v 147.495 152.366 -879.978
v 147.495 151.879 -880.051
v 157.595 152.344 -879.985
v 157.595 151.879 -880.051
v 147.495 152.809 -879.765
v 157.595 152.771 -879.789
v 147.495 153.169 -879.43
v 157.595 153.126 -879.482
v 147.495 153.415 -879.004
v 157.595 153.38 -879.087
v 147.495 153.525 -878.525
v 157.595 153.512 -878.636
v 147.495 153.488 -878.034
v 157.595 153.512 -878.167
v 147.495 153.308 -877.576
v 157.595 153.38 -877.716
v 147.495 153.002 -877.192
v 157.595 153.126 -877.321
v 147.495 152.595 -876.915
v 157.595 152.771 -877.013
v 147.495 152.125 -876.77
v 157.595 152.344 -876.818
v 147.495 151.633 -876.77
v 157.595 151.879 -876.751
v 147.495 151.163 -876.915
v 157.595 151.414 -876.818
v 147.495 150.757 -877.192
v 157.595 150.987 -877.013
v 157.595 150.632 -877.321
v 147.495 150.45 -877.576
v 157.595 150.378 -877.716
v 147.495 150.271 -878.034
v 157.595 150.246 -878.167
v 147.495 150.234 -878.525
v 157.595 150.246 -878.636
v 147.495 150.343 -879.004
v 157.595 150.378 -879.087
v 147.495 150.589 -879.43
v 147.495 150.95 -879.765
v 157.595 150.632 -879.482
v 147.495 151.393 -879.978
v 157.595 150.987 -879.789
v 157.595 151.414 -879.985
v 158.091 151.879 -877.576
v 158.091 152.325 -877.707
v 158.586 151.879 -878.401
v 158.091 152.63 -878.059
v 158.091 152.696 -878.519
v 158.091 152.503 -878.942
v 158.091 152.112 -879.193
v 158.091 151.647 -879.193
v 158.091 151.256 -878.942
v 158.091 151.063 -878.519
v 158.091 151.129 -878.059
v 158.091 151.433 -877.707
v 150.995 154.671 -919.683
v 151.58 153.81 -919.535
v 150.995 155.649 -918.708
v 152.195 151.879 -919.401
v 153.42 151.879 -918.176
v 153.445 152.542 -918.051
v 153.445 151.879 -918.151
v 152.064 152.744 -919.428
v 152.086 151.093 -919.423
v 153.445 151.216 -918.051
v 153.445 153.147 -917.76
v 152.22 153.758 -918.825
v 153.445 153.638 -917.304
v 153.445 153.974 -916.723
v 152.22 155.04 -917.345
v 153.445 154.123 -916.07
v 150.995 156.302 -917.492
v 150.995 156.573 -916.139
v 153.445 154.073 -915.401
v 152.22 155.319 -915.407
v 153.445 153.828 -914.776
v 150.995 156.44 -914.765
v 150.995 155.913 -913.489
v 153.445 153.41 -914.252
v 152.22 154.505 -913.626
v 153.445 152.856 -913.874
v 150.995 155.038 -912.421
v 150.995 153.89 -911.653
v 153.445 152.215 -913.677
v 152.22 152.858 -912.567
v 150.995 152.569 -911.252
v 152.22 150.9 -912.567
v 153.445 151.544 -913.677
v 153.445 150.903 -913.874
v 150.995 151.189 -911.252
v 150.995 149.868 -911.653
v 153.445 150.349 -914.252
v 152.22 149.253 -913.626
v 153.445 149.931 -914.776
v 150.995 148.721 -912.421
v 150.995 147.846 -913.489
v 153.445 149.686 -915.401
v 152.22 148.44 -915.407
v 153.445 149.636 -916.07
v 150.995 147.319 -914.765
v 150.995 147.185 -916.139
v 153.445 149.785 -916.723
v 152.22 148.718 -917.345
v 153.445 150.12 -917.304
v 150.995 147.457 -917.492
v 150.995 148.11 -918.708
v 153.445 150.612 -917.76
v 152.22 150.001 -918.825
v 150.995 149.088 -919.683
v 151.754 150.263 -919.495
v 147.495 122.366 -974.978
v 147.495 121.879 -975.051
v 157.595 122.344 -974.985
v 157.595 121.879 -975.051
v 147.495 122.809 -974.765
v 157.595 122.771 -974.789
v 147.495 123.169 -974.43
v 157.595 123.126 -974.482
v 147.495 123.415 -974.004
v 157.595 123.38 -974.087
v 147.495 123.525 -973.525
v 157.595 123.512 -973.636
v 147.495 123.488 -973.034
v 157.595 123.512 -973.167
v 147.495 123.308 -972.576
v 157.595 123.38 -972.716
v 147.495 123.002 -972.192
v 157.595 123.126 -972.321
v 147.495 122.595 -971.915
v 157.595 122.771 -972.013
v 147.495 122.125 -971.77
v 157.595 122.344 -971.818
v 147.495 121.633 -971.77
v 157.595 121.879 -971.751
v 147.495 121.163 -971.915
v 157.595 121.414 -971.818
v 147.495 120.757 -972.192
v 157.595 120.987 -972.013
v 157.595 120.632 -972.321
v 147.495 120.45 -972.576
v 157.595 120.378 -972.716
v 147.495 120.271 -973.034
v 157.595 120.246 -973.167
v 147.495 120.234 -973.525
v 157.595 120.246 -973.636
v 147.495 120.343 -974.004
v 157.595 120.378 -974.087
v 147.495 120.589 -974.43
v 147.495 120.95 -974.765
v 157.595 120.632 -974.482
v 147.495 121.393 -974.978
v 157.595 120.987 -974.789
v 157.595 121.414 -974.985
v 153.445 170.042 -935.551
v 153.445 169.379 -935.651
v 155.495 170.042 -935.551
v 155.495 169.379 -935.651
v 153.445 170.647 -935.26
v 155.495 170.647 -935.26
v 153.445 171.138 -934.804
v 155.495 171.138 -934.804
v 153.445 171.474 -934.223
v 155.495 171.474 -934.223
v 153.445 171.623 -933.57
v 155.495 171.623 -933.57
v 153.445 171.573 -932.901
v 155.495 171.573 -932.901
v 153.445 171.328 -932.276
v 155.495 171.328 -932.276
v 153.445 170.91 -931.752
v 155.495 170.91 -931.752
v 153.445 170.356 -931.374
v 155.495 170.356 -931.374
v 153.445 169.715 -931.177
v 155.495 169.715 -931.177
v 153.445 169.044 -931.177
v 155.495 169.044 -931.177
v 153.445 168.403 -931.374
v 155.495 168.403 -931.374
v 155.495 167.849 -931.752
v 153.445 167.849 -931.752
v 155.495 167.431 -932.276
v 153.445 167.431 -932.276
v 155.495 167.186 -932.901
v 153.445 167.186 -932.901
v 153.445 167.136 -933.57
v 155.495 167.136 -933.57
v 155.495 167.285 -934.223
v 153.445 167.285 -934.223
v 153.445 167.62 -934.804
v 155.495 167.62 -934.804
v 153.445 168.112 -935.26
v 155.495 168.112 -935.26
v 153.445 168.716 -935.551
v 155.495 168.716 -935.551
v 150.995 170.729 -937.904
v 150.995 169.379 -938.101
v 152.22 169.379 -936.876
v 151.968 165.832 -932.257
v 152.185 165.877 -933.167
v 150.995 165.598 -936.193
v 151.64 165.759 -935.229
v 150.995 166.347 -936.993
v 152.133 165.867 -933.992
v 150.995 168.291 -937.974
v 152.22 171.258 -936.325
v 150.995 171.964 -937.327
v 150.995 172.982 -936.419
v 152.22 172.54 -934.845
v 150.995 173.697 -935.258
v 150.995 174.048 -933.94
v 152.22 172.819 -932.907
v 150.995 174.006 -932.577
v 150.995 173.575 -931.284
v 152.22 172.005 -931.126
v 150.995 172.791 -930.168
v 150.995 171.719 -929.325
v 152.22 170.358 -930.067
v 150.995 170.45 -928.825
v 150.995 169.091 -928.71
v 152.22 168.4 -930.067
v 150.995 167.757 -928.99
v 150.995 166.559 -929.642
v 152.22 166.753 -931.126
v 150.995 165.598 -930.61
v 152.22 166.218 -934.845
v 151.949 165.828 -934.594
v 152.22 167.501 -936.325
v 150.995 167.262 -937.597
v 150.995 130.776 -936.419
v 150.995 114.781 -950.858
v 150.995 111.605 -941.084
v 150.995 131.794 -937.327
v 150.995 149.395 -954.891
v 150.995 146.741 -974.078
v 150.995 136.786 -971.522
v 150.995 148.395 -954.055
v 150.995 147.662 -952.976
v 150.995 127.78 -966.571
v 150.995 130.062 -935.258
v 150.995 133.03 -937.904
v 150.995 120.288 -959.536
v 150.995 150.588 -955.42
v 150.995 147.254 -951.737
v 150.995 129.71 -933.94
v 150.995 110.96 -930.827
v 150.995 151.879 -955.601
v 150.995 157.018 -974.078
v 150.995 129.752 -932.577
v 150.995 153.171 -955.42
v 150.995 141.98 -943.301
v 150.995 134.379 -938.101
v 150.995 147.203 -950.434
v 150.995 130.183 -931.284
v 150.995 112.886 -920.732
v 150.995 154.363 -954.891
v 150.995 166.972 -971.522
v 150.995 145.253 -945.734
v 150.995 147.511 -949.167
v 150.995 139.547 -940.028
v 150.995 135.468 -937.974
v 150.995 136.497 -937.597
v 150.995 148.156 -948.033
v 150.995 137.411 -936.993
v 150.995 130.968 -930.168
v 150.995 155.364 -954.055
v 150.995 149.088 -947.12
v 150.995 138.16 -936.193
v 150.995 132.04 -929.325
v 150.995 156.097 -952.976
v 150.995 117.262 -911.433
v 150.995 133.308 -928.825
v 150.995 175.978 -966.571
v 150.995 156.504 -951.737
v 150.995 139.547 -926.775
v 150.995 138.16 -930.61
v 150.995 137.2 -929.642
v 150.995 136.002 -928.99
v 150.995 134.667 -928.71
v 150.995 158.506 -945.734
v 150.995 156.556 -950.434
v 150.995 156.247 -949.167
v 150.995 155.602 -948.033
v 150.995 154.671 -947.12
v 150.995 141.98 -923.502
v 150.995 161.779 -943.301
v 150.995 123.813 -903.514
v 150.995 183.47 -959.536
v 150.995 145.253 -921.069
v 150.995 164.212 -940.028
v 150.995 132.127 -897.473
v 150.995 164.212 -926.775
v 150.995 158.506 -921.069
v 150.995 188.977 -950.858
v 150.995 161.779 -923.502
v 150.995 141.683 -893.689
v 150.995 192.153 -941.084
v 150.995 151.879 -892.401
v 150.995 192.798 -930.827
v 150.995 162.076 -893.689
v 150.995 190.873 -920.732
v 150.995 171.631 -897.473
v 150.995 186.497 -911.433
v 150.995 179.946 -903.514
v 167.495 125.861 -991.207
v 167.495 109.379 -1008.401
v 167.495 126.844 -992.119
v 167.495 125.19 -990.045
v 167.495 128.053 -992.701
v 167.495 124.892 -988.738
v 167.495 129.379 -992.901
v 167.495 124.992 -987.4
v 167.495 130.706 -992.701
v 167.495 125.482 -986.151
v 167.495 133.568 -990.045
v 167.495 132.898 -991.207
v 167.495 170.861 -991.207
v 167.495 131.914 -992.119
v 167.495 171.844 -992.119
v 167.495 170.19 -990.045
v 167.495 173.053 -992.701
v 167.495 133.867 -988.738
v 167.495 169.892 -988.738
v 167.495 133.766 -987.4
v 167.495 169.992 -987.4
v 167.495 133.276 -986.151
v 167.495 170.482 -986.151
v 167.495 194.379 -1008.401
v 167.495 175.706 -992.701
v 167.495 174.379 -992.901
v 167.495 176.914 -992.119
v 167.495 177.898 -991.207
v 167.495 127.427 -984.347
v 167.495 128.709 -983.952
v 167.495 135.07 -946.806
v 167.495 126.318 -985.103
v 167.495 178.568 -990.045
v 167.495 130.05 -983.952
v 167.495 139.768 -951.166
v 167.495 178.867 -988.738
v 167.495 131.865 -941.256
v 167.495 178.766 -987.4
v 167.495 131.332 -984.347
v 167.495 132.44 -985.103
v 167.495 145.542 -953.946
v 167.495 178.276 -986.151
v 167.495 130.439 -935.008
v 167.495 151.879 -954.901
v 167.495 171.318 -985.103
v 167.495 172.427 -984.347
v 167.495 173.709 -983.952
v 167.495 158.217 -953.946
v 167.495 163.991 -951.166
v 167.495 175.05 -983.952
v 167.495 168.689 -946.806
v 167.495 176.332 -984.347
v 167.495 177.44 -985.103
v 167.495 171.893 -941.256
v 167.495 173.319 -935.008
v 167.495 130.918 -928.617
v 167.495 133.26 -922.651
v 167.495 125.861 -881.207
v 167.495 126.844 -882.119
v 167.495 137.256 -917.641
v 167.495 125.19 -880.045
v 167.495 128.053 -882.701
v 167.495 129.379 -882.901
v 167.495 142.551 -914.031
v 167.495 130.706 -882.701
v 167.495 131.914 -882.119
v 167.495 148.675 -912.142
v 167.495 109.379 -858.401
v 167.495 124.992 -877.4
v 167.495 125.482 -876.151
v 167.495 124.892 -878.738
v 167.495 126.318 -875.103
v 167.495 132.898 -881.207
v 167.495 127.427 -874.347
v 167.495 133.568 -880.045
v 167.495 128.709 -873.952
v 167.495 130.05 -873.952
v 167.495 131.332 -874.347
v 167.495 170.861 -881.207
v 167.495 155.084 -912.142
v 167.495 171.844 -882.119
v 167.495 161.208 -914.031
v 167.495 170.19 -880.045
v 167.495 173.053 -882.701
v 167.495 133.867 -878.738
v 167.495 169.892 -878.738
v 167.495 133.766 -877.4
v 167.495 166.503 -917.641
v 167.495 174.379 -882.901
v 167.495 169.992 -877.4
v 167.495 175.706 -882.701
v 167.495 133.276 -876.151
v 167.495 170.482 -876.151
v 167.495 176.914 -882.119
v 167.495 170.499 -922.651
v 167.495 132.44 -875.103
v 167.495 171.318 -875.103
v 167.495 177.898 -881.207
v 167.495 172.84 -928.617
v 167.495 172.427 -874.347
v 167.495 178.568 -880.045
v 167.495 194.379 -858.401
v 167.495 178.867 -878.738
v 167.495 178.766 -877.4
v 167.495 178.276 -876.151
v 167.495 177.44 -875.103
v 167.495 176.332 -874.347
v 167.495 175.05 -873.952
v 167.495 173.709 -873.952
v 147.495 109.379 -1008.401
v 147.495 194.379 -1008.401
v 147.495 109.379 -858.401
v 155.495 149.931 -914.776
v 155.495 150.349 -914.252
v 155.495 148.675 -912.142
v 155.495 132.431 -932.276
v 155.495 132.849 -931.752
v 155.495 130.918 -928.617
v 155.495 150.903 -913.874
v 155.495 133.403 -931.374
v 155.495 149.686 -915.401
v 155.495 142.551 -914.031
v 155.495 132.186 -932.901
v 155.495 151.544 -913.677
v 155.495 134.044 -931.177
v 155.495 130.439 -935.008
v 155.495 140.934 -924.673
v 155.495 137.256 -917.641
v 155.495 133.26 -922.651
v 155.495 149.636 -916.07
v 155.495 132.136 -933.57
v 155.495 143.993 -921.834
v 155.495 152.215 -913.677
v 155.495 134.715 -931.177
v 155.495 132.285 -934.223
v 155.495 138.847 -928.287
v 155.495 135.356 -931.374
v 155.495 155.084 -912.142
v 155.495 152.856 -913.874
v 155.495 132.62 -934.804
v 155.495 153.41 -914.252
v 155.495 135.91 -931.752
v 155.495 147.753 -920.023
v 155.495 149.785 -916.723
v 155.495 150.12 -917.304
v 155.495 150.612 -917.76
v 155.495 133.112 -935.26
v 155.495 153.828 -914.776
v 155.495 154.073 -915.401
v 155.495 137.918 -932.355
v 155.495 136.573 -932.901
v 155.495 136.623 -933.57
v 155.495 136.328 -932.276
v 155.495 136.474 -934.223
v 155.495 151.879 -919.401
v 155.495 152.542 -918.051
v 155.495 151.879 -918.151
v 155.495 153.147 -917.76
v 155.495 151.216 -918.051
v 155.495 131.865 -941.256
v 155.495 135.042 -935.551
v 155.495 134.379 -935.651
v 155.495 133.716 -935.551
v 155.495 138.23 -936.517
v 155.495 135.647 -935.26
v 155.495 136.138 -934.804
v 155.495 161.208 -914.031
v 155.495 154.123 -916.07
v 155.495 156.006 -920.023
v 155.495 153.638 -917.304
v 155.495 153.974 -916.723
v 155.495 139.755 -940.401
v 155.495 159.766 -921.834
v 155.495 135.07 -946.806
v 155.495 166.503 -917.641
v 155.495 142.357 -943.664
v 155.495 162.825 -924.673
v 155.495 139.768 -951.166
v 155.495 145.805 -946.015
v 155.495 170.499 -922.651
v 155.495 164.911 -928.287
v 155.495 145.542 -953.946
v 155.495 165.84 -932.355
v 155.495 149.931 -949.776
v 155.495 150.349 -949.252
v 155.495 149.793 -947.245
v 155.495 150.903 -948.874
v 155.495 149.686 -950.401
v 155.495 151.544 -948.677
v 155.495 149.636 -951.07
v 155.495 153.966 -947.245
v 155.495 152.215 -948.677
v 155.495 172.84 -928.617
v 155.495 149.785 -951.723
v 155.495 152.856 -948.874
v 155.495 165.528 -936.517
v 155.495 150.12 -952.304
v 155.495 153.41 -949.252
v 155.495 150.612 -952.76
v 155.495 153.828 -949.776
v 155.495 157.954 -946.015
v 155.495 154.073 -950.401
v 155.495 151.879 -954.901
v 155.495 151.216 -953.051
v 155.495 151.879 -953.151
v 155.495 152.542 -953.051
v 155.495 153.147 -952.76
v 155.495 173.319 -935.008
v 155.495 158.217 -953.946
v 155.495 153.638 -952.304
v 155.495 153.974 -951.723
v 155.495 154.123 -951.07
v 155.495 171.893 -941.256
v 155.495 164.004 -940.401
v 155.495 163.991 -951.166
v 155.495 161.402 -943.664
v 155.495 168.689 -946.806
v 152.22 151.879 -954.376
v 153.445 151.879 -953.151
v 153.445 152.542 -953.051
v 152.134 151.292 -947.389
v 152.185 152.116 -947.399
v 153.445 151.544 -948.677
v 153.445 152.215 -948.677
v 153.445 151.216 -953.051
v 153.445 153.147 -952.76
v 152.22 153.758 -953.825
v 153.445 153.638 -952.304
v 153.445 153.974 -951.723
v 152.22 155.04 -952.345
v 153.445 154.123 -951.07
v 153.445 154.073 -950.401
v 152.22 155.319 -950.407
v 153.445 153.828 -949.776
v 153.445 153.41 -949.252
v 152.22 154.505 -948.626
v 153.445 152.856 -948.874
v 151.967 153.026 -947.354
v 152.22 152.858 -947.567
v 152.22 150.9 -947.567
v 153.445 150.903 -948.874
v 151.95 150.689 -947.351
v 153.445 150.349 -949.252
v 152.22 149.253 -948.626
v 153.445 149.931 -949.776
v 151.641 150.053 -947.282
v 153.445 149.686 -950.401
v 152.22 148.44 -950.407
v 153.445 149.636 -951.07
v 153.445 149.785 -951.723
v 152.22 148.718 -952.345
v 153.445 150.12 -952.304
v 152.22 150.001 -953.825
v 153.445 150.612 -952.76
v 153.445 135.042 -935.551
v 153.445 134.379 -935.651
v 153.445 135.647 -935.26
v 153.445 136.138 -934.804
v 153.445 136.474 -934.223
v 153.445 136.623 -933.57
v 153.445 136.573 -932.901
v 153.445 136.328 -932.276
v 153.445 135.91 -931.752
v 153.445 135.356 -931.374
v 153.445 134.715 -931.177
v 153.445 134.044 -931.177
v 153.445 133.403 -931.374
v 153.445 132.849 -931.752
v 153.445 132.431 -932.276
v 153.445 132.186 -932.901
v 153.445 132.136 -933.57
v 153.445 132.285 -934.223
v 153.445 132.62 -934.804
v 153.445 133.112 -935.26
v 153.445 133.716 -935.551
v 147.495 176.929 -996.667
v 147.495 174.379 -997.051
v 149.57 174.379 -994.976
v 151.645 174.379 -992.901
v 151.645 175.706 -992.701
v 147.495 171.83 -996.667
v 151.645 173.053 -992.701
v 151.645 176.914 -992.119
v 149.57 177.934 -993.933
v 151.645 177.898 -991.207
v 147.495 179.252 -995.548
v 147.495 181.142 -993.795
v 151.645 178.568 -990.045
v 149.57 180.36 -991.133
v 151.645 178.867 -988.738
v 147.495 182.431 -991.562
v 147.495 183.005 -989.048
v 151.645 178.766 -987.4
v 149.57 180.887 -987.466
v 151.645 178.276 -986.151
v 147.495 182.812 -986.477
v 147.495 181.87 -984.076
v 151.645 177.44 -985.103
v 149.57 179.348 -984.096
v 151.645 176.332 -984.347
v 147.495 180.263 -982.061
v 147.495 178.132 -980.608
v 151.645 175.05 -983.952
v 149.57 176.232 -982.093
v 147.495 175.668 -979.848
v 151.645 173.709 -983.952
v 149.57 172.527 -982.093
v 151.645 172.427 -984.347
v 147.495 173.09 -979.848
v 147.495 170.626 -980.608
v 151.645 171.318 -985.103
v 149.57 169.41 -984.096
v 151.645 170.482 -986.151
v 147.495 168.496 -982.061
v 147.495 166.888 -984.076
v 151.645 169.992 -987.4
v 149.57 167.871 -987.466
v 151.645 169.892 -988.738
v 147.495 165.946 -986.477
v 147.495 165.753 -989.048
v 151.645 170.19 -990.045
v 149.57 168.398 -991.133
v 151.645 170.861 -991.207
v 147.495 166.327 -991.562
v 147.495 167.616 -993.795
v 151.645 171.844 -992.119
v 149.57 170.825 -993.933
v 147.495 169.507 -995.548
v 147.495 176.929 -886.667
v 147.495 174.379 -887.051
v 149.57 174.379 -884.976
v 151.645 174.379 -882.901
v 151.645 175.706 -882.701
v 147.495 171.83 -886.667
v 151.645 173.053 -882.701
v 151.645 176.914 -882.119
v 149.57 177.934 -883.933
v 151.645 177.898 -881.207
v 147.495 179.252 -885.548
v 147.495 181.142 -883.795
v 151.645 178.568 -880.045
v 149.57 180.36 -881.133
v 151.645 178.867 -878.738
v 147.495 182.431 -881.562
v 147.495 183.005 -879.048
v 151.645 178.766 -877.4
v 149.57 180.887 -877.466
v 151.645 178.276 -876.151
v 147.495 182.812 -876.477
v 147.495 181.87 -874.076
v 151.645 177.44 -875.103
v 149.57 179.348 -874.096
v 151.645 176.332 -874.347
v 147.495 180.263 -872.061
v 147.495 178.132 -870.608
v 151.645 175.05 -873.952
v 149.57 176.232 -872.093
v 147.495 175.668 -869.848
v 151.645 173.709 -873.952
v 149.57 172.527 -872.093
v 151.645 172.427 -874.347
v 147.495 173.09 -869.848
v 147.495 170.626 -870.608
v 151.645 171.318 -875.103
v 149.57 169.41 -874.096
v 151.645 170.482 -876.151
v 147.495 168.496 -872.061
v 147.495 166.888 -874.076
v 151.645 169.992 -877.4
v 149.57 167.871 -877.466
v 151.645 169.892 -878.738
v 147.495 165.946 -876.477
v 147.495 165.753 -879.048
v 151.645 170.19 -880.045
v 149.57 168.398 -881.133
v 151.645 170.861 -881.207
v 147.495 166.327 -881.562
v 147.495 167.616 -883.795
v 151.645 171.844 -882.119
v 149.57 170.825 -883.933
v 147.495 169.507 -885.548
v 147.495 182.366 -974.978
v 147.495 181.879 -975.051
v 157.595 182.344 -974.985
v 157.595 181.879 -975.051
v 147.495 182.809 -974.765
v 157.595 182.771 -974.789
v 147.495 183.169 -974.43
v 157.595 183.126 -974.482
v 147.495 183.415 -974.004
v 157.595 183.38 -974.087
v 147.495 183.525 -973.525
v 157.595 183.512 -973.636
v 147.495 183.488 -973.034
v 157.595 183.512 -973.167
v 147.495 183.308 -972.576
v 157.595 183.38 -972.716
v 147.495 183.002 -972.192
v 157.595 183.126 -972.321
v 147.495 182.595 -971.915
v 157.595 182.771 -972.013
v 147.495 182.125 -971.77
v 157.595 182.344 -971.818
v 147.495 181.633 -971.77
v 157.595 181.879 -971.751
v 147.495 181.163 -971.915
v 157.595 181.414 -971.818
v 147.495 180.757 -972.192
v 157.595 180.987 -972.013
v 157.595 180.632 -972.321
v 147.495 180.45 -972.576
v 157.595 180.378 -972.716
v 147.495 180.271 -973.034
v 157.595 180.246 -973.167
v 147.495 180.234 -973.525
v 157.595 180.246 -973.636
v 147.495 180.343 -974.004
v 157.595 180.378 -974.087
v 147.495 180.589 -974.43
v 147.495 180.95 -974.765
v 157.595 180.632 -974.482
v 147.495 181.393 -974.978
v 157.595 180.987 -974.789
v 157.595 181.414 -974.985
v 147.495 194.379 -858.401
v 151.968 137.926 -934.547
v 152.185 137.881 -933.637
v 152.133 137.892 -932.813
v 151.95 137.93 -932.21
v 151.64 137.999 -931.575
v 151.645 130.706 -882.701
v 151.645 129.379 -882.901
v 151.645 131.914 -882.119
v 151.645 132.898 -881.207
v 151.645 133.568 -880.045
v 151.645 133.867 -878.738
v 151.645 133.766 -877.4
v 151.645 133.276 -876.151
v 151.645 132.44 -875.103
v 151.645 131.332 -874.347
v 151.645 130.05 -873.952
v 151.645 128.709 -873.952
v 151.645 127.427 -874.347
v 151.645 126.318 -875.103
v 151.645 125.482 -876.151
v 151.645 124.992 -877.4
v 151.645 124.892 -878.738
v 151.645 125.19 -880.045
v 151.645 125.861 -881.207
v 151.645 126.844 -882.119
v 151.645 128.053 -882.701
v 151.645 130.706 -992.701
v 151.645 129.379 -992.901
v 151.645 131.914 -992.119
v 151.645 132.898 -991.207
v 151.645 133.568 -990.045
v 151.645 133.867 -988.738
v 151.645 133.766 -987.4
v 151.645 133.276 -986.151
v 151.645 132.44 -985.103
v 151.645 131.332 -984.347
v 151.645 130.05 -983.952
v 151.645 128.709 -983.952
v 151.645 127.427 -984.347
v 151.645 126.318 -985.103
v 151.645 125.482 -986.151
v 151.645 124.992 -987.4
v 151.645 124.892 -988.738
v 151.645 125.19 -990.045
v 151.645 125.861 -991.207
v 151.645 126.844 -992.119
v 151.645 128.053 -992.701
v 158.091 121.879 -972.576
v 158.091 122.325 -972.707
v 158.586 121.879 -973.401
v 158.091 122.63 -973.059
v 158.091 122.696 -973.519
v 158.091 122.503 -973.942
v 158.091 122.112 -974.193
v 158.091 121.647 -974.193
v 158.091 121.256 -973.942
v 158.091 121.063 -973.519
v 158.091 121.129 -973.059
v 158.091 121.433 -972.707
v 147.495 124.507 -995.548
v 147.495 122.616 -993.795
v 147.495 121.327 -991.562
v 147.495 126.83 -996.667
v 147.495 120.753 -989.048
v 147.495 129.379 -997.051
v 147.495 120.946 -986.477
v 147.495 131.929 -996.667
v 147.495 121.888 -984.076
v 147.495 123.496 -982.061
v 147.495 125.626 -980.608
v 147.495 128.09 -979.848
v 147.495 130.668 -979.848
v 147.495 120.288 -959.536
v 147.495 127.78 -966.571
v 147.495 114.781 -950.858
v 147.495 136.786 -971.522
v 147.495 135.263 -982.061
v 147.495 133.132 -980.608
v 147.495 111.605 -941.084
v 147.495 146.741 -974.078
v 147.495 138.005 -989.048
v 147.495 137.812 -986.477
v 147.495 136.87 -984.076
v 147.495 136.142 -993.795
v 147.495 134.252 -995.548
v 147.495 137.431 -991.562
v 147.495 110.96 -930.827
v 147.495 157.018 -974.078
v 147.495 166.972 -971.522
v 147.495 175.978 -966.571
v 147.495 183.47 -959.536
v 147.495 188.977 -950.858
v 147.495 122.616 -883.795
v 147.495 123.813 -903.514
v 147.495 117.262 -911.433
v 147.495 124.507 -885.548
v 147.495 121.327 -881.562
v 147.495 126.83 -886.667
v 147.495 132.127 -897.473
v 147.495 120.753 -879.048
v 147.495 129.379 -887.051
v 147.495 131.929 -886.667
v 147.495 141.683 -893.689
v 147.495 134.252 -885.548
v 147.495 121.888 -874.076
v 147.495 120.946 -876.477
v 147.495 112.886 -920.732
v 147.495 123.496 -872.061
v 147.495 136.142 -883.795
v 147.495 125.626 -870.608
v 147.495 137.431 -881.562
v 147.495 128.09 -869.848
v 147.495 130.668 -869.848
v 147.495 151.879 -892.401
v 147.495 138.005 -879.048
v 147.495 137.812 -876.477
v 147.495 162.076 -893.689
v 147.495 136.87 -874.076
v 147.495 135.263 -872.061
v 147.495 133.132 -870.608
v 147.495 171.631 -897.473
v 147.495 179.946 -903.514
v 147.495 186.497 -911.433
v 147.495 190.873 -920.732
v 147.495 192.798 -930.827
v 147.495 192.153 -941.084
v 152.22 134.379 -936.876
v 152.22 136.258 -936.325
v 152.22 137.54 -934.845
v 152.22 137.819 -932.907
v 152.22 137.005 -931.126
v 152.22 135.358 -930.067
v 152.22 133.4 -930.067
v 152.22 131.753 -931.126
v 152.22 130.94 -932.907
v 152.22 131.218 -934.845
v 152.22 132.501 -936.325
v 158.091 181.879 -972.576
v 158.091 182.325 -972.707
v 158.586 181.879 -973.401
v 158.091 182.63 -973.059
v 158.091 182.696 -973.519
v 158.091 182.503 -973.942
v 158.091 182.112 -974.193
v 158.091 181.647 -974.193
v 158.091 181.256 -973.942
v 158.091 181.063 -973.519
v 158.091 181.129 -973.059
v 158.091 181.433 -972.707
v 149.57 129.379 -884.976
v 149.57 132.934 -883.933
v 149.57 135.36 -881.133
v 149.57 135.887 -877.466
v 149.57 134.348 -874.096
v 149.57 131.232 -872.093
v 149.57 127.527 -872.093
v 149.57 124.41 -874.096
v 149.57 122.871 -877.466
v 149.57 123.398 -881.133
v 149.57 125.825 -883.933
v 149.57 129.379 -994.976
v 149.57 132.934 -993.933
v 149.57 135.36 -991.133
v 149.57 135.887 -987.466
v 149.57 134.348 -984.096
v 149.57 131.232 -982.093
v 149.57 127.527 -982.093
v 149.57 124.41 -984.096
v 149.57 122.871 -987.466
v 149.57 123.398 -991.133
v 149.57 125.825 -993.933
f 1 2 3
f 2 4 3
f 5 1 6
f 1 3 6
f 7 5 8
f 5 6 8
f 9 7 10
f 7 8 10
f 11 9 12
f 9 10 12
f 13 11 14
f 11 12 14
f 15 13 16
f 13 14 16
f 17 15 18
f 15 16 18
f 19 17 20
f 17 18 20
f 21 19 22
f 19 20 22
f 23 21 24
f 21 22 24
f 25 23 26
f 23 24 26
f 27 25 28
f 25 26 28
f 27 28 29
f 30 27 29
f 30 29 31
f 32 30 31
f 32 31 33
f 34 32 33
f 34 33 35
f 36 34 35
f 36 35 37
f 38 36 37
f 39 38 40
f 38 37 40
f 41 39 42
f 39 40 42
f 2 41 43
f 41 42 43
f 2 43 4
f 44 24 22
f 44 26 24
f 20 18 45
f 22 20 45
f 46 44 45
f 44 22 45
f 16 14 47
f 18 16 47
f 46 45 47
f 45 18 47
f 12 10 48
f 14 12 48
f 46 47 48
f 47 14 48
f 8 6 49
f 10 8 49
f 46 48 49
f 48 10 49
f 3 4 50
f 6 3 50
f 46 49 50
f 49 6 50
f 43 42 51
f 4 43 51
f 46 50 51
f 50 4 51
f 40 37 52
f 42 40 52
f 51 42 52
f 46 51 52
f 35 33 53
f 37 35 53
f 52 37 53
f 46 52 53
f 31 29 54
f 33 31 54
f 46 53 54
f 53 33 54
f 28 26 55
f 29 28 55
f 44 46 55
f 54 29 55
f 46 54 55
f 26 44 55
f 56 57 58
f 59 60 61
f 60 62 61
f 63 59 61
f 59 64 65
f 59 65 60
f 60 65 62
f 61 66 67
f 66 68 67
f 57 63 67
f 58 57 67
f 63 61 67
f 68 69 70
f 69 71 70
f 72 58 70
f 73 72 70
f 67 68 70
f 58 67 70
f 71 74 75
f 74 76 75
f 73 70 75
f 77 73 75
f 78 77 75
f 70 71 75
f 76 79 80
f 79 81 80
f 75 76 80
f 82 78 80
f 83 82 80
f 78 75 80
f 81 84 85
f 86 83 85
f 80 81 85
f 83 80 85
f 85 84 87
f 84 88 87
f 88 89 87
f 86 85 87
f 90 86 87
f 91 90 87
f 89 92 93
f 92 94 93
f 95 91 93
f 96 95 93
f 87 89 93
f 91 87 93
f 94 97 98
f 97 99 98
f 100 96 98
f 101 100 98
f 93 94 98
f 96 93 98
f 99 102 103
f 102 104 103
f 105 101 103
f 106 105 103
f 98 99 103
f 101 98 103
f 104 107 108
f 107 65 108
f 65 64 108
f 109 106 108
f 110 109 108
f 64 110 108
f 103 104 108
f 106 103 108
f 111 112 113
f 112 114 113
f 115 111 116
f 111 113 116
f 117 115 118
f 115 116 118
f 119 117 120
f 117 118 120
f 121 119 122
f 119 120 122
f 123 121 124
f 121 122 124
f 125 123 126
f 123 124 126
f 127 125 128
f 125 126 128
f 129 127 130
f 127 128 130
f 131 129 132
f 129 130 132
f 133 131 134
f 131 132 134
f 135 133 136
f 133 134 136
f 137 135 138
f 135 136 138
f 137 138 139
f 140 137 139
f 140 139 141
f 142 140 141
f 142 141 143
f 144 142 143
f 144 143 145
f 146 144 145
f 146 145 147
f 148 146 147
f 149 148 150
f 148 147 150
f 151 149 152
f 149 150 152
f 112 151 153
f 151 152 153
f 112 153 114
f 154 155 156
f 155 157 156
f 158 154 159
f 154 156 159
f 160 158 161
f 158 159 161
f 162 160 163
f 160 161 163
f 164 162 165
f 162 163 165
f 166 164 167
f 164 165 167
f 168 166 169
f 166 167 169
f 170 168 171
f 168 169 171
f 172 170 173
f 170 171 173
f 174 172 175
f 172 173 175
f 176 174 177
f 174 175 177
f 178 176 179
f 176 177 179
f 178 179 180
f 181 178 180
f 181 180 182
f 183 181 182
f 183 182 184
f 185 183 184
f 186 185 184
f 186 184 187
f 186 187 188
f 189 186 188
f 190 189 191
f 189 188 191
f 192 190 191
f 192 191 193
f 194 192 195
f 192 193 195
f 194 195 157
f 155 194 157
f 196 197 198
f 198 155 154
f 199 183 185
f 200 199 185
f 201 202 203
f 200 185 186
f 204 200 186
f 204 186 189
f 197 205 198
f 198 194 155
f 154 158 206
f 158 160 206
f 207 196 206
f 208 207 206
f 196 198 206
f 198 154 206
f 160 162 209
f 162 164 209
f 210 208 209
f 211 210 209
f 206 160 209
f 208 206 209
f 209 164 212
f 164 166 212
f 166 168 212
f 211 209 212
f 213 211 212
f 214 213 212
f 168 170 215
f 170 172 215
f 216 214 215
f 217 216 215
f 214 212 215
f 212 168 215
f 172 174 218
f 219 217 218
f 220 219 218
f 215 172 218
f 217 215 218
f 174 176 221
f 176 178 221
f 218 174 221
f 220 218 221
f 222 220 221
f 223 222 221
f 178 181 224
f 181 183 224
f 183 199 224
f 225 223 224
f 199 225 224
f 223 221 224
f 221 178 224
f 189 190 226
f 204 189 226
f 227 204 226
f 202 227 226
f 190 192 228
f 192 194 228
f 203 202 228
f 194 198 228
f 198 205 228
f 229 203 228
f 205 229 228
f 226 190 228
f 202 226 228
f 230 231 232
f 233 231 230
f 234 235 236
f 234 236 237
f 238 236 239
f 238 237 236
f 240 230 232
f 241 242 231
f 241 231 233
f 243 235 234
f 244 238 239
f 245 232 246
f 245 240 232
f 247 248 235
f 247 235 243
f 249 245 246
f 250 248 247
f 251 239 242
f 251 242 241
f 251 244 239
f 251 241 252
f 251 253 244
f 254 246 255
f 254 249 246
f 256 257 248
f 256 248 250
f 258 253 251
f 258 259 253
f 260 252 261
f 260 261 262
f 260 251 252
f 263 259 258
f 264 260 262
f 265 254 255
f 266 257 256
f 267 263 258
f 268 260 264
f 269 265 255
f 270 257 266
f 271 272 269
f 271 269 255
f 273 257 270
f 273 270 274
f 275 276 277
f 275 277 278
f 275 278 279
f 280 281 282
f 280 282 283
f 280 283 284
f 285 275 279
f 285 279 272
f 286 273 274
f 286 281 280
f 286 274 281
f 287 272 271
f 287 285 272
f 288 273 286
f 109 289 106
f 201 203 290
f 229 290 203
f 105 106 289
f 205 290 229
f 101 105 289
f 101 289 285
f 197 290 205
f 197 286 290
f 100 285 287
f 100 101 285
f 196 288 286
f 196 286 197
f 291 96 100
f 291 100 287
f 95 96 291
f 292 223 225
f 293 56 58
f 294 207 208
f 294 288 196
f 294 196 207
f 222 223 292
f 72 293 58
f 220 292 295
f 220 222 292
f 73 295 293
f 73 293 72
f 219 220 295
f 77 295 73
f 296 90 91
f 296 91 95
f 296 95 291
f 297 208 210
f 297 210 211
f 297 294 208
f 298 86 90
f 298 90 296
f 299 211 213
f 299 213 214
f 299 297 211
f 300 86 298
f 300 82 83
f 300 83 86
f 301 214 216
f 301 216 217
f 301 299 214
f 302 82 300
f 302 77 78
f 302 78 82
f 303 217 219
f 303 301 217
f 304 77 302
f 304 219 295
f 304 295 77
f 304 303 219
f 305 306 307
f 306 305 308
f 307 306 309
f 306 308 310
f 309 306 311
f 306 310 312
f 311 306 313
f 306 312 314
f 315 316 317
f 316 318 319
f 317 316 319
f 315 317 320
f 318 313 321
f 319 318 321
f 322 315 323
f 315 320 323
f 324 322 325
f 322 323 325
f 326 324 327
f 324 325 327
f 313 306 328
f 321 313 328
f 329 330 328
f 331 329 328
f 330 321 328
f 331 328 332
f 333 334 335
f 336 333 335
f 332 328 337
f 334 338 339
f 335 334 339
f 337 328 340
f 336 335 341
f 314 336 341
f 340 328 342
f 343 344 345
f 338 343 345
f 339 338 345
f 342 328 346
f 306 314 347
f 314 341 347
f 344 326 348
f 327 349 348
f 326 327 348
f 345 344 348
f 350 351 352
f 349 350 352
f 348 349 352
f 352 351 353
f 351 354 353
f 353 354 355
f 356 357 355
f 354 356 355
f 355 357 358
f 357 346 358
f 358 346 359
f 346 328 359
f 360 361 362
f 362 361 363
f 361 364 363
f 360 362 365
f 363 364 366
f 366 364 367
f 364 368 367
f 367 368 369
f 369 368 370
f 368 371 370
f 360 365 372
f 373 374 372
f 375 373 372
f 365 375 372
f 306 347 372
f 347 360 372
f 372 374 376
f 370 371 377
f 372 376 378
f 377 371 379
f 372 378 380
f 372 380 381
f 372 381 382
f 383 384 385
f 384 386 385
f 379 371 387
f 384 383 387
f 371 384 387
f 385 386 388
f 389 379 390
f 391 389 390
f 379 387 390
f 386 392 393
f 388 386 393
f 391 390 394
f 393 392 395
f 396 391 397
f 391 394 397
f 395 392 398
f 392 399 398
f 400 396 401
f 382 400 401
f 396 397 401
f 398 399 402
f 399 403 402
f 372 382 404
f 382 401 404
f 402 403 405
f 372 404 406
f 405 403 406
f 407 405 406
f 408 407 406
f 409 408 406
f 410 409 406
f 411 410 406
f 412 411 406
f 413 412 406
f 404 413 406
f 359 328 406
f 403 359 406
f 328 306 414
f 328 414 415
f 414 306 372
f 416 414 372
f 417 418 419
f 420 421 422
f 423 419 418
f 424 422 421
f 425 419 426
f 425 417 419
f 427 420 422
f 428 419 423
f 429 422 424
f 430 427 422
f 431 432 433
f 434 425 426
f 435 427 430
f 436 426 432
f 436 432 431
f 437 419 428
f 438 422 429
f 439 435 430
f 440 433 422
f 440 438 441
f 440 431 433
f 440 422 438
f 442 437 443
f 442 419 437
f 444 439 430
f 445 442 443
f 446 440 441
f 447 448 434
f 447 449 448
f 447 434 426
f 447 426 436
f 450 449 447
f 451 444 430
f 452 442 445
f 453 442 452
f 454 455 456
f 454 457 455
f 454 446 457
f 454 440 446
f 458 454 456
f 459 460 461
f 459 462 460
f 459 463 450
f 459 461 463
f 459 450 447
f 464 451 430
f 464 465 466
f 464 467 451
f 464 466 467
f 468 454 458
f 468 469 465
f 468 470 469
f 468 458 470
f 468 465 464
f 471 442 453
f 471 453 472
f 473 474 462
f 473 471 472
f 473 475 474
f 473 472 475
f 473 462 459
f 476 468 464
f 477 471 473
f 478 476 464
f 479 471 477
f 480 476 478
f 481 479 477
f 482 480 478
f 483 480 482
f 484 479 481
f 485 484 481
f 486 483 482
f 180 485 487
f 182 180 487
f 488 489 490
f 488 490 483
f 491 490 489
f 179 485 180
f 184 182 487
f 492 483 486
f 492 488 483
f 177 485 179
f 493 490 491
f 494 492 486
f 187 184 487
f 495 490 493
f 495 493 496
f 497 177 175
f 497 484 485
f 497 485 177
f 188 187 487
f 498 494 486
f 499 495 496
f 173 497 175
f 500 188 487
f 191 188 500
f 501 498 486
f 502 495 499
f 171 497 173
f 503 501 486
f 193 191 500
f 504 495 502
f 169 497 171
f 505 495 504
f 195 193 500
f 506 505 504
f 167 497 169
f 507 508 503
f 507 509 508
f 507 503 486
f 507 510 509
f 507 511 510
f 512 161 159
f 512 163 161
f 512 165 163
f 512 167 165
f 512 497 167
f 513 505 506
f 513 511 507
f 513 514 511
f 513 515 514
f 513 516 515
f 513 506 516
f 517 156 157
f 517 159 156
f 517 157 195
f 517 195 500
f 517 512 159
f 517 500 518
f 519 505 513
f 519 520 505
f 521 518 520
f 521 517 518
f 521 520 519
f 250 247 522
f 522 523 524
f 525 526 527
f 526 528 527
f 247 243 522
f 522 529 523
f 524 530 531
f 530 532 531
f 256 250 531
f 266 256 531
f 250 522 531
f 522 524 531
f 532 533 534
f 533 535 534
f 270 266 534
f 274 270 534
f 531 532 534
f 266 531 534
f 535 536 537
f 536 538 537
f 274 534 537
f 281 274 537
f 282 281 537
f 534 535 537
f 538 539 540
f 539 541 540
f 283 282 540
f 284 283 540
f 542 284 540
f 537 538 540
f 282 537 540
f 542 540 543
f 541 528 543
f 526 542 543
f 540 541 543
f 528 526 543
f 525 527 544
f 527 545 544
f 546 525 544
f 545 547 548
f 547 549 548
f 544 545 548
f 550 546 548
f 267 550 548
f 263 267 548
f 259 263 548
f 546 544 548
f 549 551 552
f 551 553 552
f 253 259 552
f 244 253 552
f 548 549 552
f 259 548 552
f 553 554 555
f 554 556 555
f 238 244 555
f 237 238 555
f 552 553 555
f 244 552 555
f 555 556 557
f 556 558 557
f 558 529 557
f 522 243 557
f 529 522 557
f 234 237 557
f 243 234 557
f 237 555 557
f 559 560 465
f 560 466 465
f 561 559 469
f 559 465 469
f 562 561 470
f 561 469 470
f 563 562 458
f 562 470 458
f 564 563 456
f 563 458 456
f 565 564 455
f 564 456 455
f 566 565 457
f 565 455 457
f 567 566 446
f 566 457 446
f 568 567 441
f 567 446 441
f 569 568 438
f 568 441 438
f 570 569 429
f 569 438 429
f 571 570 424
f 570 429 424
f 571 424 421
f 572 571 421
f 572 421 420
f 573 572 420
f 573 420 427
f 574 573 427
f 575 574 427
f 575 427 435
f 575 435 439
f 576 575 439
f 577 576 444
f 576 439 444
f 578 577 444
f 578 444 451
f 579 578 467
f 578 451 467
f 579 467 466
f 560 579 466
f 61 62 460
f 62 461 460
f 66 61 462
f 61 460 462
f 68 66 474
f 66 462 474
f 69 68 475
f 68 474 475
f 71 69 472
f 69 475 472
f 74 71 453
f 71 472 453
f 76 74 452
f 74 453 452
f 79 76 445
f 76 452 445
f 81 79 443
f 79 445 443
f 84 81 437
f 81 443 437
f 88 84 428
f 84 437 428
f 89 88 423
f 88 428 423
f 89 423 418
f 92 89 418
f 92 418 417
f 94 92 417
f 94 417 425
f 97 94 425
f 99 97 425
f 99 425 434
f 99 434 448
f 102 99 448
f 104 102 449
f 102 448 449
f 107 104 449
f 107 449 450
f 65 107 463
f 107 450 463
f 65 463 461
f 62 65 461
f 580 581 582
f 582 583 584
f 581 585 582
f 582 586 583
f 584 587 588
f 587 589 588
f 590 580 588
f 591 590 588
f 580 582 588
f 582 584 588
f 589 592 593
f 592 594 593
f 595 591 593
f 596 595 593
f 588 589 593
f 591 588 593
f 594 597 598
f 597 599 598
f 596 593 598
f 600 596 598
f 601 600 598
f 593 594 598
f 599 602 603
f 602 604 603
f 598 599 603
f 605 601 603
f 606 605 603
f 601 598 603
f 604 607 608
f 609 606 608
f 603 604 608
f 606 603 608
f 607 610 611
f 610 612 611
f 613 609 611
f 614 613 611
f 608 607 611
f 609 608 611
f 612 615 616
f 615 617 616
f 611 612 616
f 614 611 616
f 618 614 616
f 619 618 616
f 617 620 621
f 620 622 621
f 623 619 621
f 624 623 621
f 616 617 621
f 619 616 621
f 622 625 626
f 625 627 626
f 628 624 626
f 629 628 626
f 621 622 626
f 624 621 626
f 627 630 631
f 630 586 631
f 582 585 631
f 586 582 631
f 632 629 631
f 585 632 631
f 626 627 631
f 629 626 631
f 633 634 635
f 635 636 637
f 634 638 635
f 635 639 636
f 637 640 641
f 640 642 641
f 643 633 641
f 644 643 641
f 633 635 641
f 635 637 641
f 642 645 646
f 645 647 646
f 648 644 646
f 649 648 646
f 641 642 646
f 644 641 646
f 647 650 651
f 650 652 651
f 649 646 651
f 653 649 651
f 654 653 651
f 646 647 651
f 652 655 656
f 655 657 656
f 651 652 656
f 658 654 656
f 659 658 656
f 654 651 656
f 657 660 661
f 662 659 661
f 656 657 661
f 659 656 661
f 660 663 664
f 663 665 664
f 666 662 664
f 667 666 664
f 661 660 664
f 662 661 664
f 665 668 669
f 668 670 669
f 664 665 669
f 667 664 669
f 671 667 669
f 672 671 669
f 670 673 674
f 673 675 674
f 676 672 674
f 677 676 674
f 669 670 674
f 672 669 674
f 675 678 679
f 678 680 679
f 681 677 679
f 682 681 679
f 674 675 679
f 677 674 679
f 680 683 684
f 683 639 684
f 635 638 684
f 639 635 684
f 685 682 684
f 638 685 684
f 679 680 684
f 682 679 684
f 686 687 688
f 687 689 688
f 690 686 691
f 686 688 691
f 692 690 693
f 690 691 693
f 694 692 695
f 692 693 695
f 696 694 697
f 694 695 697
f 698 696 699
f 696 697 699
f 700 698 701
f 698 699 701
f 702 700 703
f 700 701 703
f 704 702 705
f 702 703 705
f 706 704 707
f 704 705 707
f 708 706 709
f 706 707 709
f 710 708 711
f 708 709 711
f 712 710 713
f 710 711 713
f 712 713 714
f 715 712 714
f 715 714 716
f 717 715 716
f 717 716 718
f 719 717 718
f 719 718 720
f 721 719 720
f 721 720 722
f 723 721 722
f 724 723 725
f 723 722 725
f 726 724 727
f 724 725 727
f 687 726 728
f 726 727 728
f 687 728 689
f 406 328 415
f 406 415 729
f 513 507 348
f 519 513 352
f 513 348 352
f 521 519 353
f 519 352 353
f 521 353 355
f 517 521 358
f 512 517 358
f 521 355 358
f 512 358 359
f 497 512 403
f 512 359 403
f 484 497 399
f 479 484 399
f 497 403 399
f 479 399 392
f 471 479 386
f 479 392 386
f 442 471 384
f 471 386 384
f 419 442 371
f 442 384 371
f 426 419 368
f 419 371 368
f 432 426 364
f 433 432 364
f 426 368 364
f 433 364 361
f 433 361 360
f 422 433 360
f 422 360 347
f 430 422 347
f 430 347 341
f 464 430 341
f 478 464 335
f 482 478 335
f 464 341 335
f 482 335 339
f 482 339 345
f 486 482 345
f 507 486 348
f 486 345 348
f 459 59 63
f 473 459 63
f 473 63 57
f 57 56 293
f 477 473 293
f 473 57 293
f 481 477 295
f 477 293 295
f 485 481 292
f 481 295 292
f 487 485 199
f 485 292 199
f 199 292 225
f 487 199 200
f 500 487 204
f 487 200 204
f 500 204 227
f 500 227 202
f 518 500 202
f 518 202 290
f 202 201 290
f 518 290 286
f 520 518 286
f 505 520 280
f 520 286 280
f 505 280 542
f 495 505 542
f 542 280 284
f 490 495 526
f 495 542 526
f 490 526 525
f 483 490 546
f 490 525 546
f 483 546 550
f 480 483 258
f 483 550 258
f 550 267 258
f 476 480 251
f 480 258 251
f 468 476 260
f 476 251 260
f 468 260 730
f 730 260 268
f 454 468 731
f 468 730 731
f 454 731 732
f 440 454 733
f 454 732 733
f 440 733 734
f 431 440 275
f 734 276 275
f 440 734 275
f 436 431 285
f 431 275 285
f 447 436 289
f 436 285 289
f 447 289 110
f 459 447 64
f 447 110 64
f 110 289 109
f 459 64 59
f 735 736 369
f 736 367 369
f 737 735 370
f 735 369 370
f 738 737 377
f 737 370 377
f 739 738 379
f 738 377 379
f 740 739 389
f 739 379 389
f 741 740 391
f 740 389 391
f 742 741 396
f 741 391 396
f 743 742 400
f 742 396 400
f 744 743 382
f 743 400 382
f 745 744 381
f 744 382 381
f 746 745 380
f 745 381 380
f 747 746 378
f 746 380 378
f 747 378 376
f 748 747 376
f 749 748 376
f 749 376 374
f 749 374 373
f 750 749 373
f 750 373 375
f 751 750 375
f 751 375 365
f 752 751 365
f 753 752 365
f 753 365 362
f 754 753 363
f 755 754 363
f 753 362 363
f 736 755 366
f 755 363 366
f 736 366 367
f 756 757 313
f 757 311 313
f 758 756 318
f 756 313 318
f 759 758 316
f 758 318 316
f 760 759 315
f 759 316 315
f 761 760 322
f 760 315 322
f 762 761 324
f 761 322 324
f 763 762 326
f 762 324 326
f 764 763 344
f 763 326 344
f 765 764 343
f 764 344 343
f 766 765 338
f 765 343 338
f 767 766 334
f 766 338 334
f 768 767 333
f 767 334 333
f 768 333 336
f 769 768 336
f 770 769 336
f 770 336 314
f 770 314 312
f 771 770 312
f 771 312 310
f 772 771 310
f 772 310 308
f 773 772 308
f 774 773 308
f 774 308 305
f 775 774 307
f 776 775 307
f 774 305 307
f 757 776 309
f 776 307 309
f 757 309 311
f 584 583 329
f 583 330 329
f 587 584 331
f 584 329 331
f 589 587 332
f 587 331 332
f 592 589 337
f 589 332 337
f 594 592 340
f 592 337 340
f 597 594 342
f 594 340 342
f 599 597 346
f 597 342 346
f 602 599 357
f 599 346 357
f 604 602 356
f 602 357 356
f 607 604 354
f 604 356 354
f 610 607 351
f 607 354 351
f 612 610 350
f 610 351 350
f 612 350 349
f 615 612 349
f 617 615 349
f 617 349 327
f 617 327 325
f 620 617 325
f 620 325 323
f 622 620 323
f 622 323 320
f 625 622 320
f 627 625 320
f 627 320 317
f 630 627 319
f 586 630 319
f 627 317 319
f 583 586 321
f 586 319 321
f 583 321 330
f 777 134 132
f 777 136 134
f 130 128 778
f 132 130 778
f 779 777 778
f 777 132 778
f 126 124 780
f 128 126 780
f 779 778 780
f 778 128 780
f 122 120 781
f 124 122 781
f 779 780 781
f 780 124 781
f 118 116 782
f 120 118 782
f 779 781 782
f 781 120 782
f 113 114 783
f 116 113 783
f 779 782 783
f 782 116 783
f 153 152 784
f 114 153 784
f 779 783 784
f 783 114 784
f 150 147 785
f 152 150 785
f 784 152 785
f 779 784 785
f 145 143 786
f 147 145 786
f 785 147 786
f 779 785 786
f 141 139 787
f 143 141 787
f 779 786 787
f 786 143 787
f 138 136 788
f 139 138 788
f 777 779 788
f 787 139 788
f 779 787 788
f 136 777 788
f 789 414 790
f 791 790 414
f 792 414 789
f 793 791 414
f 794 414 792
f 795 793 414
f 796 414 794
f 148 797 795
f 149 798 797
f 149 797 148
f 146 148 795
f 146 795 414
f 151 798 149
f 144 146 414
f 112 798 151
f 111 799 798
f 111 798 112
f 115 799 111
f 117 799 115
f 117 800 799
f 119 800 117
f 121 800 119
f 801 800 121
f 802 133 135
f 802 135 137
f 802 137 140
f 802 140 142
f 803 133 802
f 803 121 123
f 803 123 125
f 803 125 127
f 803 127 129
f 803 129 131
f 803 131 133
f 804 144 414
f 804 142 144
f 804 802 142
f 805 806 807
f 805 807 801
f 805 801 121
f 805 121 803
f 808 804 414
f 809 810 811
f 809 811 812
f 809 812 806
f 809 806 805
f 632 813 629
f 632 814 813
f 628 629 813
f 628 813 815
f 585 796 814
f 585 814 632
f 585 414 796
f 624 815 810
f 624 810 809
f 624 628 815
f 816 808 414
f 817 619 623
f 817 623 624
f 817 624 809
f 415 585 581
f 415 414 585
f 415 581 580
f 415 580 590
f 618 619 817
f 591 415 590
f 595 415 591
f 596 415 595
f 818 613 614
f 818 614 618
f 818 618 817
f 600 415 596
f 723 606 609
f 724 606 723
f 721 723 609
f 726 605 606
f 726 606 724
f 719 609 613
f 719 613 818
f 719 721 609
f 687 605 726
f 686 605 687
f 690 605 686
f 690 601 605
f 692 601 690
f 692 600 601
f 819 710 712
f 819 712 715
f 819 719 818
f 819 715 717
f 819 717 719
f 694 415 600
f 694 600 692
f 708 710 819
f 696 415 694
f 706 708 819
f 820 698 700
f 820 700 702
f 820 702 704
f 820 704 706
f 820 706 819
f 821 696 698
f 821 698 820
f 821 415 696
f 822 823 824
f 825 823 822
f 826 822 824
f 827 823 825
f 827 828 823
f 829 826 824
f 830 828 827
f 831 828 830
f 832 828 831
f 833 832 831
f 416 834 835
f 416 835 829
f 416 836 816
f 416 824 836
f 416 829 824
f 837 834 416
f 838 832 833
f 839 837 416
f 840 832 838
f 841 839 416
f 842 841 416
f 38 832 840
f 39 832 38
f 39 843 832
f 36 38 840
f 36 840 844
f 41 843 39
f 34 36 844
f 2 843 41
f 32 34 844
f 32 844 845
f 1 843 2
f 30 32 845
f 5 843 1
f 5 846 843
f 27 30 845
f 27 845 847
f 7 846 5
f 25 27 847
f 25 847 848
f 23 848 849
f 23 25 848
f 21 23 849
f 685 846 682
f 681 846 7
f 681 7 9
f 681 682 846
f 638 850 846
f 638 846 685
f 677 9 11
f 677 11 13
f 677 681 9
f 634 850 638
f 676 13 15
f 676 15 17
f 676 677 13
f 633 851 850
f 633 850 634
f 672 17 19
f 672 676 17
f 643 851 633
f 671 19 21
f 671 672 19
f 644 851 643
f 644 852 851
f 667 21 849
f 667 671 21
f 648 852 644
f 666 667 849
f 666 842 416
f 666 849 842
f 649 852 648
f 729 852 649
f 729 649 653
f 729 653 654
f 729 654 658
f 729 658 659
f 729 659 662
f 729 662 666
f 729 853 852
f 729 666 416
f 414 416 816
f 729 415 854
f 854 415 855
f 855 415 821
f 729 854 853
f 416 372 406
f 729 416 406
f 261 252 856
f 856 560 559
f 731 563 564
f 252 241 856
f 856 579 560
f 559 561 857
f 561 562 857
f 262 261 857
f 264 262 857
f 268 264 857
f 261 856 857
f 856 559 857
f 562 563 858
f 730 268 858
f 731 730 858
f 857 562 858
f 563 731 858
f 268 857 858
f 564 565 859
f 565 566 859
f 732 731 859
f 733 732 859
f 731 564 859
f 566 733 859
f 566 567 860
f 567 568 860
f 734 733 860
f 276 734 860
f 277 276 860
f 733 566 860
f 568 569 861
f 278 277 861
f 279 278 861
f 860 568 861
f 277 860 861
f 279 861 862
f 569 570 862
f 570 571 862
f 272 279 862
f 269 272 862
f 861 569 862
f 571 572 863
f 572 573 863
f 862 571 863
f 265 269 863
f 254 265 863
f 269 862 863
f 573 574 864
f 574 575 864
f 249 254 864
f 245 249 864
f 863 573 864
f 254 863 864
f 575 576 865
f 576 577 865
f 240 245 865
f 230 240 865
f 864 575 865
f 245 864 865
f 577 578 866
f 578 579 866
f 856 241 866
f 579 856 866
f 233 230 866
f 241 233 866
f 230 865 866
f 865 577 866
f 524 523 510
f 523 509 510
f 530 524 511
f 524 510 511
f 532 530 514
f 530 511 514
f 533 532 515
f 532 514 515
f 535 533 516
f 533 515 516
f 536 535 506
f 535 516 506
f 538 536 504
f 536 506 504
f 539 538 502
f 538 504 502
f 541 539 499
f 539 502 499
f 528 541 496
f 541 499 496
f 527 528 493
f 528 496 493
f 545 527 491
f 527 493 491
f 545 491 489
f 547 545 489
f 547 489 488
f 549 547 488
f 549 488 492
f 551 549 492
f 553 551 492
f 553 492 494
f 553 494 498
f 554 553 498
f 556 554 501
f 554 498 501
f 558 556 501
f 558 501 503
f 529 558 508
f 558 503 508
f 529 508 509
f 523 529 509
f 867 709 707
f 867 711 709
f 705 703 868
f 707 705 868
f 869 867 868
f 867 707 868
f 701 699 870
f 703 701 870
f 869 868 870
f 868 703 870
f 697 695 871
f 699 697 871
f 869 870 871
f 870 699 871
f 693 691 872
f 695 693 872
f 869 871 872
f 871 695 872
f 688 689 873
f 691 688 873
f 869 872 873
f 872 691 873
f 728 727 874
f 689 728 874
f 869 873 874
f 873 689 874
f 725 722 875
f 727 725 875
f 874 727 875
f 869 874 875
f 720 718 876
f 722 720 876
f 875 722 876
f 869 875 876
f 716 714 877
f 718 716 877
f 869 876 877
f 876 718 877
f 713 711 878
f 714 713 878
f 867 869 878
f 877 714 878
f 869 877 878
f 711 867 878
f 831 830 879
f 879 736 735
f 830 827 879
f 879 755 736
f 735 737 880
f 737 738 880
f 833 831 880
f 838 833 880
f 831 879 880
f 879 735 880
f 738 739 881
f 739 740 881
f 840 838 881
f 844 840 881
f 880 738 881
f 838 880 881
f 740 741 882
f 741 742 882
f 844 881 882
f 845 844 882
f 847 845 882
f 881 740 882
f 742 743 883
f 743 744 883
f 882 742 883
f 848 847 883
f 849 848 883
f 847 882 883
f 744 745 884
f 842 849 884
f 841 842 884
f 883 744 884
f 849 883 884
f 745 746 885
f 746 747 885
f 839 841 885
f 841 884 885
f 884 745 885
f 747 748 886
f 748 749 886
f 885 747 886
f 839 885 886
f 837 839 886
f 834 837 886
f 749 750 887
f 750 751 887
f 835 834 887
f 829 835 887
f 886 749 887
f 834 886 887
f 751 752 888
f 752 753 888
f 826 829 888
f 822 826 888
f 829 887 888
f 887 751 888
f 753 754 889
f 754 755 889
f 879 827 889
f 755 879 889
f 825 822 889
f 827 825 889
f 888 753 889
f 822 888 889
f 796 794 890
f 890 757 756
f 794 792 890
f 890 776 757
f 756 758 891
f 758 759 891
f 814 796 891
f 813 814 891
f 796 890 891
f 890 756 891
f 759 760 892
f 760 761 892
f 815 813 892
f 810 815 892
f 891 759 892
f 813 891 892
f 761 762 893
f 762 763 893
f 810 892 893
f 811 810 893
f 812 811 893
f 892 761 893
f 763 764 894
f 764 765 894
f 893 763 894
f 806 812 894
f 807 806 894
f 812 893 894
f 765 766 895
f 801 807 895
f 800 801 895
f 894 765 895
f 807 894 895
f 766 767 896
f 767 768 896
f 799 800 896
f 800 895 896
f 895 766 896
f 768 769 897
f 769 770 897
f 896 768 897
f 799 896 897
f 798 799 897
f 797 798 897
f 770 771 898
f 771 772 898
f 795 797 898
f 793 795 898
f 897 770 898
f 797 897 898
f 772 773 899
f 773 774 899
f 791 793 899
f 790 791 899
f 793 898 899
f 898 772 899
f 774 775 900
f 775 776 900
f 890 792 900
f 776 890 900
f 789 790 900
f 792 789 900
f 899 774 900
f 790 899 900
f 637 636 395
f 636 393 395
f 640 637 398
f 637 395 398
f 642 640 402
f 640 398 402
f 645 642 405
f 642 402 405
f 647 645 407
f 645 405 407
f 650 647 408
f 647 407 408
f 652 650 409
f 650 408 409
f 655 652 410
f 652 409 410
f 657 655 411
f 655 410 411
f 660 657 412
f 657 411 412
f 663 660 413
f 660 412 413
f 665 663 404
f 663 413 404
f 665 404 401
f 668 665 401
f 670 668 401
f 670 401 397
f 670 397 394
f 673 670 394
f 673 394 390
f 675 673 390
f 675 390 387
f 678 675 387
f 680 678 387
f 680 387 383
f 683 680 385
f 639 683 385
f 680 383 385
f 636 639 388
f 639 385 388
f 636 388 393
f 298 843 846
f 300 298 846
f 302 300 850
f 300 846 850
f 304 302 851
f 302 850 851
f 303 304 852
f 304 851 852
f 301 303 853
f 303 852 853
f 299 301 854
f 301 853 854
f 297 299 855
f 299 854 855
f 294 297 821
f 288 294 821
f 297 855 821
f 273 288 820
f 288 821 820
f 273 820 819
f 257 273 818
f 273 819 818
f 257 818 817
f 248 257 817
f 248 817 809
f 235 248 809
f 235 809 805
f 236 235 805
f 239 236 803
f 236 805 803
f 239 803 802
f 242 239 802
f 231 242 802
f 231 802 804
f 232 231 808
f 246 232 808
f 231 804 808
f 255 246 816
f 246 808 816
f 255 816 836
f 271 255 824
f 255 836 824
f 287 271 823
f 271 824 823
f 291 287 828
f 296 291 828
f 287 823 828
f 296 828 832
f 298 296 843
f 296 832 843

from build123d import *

# Parameters (mm, degrees)
BOSS_EXTRUDE1_DEPTH                             = 4.75
BOSS_EXTRUDE1_DEPTH_BACK                        = 15.25
SKETCH1_W                                       = 150
SKETCH1_H                                       = 85
SKETCH2_R                                       = 21.5
F_1MM_CLEARANCE_DEPTH                           = 12
SKETCH5_R                                       = 41
CUT_EXTRUDE2_DEPTH                              = 3.5
SKETCH6_R                                       = 14
CUT_EXTRUDE3_DEPTH                              = 11.5
CSK_FOR_M8_FLAT_HEAD_MACHINE_SCREW1_D           = 9
CSK_FOR_M8_FLAT_HEAD_MACHINE_SCREW1_CSINK_D     = 17.3
CSK_FOR_M8_FLAT_HEAD_MACHINE_SCREW1_CSINK_ANGLE = 90
CSK_FOR_M4_FLAT_HEAD_MACHINE_SCREW1_D           = 4.5
CSK_FOR_M4_FLAT_HEAD_MACHINE_SCREW1_CSINK_D     = 9.4
CSK_FOR_M4_FLAT_HEAD_MACHINE_SCREW1_CSINK_ANGLE = 90
M4X0_7_TAPPED_HOLE1_D                           = 3.3
M4X0_7_TAPPED_HOLE1_DEPTH                       = 10.1
M4X0_7_TAPPED_HOLE1_TIP                         = 0.991420021


with BuildPart() as part:
    # Sketch1 → Boss-Extrude1 (new, two sides: drawn at the far end of the back side and taken through both)
    with BuildSketch(Plane.ZY.offset(-152.244801117).offset(-BOSS_EXTRUDE1_DEPTH_BACK)):
        with Locations((-933.40139902, 151.879264394)):
            Rectangle(SKETCH1_W, SKETCH1_H)
    extrude(amount=BOSS_EXTRUDE1_DEPTH + BOSS_EXTRUDE1_DEPTH_BACK)

    # Sketch2 → 1mm clearance (cut)
    with BuildSketch(Plane(origin=(167.494801117, 0, 0), x_dir=(0, 0, -1), z_dir=(1, 0, 0))):
        with Locations((933.40139902, 151.879264394)):
            Circle(SKETCH2_R)
    extrude(amount=-F_1MM_CLEARANCE_DEPTH, mode=Mode.SUBTRACT)

    # Sketch5 → Cut-Extrude2 (cut)
    with BuildSketch(Plane.ZY.offset(-147.494801117)):
        with Locations((-933.40139902, 151.879264394)):
            Circle(SKETCH5_R)
    extrude(amount=-CUT_EXTRUDE2_DEPTH, mode=Mode.SUBTRACT)

    # Sketch6 → Cut-Extrude3 (cut)
    with BuildSketch(Plane.ZY.offset(-150.994801117)):
        with Locations((-933.40139902, 151.879264394)):
            Circle(SKETCH6_R)
    extrude(amount=-CUT_EXTRUDE3_DEPTH, mode=Mode.SUBTRACT)

    # CSK for M8 Flat Head Machine Screw1 (through all)
    with Locations(Plane.ZY.offset(-147.494801117)):
        with Locations((-878.40139902, 129.379264394), (-878.40139902, 174.379264394), (-988.40139902, 129.379264394), (-988.40139902, 174.379264394)):
            CounterSinkHole(CSK_FOR_M8_FLAT_HEAD_MACHINE_SCREW1_D / 2, CSK_FOR_M8_FLAT_HEAD_MACHINE_SCREW1_CSINK_D / 2, counter_sink_angle=CSK_FOR_M8_FLAT_HEAD_MACHINE_SCREW1_CSINK_ANGLE)

    # CSK for M4 Flat Head Machine Screw1 (through all)
    with Locations(Plane.ZY.offset(-150.994801117)):
        with Locations((-933.40139902, 134.379264394), (-950.90139902, 151.879264394), (-915.90139902, 151.879264394), (-933.40139902, 169.379264394)):
            CounterSinkHole(CSK_FOR_M4_FLAT_HEAD_MACHINE_SCREW1_D / 2, CSK_FOR_M4_FLAT_HEAD_MACHINE_SCREW1_CSINK_D / 2, counter_sink_angle=CSK_FOR_M4_FLAT_HEAD_MACHINE_SCREW1_CSINK_ANGLE)

    # M4x0.7 Tapped Hole1
    with Locations(Plane.ZY.offset(-147.494801117)):
        with Locations((-878.40139902, 151.879264394), (-973.40139902, 121.879264394), (-973.40139902, 181.879264394)):
            Hole(M4X0_7_TAPPED_HOLE1_D / 2, depth=M4X0_7_TAPPED_HOLE1_DEPTH)
            with Locations((0, 0, -(M4X0_7_TAPPED_HOLE1_DEPTH + M4X0_7_TAPPED_HOLE1_TIP / 2))):  # 118° drill point
                Cone(0, M4X0_7_TAPPED_HOLE1_D / 2, M4X0_7_TAPPED_HOLE1_TIP, mode=Mode.SUBTRACT)


solid = part.part
